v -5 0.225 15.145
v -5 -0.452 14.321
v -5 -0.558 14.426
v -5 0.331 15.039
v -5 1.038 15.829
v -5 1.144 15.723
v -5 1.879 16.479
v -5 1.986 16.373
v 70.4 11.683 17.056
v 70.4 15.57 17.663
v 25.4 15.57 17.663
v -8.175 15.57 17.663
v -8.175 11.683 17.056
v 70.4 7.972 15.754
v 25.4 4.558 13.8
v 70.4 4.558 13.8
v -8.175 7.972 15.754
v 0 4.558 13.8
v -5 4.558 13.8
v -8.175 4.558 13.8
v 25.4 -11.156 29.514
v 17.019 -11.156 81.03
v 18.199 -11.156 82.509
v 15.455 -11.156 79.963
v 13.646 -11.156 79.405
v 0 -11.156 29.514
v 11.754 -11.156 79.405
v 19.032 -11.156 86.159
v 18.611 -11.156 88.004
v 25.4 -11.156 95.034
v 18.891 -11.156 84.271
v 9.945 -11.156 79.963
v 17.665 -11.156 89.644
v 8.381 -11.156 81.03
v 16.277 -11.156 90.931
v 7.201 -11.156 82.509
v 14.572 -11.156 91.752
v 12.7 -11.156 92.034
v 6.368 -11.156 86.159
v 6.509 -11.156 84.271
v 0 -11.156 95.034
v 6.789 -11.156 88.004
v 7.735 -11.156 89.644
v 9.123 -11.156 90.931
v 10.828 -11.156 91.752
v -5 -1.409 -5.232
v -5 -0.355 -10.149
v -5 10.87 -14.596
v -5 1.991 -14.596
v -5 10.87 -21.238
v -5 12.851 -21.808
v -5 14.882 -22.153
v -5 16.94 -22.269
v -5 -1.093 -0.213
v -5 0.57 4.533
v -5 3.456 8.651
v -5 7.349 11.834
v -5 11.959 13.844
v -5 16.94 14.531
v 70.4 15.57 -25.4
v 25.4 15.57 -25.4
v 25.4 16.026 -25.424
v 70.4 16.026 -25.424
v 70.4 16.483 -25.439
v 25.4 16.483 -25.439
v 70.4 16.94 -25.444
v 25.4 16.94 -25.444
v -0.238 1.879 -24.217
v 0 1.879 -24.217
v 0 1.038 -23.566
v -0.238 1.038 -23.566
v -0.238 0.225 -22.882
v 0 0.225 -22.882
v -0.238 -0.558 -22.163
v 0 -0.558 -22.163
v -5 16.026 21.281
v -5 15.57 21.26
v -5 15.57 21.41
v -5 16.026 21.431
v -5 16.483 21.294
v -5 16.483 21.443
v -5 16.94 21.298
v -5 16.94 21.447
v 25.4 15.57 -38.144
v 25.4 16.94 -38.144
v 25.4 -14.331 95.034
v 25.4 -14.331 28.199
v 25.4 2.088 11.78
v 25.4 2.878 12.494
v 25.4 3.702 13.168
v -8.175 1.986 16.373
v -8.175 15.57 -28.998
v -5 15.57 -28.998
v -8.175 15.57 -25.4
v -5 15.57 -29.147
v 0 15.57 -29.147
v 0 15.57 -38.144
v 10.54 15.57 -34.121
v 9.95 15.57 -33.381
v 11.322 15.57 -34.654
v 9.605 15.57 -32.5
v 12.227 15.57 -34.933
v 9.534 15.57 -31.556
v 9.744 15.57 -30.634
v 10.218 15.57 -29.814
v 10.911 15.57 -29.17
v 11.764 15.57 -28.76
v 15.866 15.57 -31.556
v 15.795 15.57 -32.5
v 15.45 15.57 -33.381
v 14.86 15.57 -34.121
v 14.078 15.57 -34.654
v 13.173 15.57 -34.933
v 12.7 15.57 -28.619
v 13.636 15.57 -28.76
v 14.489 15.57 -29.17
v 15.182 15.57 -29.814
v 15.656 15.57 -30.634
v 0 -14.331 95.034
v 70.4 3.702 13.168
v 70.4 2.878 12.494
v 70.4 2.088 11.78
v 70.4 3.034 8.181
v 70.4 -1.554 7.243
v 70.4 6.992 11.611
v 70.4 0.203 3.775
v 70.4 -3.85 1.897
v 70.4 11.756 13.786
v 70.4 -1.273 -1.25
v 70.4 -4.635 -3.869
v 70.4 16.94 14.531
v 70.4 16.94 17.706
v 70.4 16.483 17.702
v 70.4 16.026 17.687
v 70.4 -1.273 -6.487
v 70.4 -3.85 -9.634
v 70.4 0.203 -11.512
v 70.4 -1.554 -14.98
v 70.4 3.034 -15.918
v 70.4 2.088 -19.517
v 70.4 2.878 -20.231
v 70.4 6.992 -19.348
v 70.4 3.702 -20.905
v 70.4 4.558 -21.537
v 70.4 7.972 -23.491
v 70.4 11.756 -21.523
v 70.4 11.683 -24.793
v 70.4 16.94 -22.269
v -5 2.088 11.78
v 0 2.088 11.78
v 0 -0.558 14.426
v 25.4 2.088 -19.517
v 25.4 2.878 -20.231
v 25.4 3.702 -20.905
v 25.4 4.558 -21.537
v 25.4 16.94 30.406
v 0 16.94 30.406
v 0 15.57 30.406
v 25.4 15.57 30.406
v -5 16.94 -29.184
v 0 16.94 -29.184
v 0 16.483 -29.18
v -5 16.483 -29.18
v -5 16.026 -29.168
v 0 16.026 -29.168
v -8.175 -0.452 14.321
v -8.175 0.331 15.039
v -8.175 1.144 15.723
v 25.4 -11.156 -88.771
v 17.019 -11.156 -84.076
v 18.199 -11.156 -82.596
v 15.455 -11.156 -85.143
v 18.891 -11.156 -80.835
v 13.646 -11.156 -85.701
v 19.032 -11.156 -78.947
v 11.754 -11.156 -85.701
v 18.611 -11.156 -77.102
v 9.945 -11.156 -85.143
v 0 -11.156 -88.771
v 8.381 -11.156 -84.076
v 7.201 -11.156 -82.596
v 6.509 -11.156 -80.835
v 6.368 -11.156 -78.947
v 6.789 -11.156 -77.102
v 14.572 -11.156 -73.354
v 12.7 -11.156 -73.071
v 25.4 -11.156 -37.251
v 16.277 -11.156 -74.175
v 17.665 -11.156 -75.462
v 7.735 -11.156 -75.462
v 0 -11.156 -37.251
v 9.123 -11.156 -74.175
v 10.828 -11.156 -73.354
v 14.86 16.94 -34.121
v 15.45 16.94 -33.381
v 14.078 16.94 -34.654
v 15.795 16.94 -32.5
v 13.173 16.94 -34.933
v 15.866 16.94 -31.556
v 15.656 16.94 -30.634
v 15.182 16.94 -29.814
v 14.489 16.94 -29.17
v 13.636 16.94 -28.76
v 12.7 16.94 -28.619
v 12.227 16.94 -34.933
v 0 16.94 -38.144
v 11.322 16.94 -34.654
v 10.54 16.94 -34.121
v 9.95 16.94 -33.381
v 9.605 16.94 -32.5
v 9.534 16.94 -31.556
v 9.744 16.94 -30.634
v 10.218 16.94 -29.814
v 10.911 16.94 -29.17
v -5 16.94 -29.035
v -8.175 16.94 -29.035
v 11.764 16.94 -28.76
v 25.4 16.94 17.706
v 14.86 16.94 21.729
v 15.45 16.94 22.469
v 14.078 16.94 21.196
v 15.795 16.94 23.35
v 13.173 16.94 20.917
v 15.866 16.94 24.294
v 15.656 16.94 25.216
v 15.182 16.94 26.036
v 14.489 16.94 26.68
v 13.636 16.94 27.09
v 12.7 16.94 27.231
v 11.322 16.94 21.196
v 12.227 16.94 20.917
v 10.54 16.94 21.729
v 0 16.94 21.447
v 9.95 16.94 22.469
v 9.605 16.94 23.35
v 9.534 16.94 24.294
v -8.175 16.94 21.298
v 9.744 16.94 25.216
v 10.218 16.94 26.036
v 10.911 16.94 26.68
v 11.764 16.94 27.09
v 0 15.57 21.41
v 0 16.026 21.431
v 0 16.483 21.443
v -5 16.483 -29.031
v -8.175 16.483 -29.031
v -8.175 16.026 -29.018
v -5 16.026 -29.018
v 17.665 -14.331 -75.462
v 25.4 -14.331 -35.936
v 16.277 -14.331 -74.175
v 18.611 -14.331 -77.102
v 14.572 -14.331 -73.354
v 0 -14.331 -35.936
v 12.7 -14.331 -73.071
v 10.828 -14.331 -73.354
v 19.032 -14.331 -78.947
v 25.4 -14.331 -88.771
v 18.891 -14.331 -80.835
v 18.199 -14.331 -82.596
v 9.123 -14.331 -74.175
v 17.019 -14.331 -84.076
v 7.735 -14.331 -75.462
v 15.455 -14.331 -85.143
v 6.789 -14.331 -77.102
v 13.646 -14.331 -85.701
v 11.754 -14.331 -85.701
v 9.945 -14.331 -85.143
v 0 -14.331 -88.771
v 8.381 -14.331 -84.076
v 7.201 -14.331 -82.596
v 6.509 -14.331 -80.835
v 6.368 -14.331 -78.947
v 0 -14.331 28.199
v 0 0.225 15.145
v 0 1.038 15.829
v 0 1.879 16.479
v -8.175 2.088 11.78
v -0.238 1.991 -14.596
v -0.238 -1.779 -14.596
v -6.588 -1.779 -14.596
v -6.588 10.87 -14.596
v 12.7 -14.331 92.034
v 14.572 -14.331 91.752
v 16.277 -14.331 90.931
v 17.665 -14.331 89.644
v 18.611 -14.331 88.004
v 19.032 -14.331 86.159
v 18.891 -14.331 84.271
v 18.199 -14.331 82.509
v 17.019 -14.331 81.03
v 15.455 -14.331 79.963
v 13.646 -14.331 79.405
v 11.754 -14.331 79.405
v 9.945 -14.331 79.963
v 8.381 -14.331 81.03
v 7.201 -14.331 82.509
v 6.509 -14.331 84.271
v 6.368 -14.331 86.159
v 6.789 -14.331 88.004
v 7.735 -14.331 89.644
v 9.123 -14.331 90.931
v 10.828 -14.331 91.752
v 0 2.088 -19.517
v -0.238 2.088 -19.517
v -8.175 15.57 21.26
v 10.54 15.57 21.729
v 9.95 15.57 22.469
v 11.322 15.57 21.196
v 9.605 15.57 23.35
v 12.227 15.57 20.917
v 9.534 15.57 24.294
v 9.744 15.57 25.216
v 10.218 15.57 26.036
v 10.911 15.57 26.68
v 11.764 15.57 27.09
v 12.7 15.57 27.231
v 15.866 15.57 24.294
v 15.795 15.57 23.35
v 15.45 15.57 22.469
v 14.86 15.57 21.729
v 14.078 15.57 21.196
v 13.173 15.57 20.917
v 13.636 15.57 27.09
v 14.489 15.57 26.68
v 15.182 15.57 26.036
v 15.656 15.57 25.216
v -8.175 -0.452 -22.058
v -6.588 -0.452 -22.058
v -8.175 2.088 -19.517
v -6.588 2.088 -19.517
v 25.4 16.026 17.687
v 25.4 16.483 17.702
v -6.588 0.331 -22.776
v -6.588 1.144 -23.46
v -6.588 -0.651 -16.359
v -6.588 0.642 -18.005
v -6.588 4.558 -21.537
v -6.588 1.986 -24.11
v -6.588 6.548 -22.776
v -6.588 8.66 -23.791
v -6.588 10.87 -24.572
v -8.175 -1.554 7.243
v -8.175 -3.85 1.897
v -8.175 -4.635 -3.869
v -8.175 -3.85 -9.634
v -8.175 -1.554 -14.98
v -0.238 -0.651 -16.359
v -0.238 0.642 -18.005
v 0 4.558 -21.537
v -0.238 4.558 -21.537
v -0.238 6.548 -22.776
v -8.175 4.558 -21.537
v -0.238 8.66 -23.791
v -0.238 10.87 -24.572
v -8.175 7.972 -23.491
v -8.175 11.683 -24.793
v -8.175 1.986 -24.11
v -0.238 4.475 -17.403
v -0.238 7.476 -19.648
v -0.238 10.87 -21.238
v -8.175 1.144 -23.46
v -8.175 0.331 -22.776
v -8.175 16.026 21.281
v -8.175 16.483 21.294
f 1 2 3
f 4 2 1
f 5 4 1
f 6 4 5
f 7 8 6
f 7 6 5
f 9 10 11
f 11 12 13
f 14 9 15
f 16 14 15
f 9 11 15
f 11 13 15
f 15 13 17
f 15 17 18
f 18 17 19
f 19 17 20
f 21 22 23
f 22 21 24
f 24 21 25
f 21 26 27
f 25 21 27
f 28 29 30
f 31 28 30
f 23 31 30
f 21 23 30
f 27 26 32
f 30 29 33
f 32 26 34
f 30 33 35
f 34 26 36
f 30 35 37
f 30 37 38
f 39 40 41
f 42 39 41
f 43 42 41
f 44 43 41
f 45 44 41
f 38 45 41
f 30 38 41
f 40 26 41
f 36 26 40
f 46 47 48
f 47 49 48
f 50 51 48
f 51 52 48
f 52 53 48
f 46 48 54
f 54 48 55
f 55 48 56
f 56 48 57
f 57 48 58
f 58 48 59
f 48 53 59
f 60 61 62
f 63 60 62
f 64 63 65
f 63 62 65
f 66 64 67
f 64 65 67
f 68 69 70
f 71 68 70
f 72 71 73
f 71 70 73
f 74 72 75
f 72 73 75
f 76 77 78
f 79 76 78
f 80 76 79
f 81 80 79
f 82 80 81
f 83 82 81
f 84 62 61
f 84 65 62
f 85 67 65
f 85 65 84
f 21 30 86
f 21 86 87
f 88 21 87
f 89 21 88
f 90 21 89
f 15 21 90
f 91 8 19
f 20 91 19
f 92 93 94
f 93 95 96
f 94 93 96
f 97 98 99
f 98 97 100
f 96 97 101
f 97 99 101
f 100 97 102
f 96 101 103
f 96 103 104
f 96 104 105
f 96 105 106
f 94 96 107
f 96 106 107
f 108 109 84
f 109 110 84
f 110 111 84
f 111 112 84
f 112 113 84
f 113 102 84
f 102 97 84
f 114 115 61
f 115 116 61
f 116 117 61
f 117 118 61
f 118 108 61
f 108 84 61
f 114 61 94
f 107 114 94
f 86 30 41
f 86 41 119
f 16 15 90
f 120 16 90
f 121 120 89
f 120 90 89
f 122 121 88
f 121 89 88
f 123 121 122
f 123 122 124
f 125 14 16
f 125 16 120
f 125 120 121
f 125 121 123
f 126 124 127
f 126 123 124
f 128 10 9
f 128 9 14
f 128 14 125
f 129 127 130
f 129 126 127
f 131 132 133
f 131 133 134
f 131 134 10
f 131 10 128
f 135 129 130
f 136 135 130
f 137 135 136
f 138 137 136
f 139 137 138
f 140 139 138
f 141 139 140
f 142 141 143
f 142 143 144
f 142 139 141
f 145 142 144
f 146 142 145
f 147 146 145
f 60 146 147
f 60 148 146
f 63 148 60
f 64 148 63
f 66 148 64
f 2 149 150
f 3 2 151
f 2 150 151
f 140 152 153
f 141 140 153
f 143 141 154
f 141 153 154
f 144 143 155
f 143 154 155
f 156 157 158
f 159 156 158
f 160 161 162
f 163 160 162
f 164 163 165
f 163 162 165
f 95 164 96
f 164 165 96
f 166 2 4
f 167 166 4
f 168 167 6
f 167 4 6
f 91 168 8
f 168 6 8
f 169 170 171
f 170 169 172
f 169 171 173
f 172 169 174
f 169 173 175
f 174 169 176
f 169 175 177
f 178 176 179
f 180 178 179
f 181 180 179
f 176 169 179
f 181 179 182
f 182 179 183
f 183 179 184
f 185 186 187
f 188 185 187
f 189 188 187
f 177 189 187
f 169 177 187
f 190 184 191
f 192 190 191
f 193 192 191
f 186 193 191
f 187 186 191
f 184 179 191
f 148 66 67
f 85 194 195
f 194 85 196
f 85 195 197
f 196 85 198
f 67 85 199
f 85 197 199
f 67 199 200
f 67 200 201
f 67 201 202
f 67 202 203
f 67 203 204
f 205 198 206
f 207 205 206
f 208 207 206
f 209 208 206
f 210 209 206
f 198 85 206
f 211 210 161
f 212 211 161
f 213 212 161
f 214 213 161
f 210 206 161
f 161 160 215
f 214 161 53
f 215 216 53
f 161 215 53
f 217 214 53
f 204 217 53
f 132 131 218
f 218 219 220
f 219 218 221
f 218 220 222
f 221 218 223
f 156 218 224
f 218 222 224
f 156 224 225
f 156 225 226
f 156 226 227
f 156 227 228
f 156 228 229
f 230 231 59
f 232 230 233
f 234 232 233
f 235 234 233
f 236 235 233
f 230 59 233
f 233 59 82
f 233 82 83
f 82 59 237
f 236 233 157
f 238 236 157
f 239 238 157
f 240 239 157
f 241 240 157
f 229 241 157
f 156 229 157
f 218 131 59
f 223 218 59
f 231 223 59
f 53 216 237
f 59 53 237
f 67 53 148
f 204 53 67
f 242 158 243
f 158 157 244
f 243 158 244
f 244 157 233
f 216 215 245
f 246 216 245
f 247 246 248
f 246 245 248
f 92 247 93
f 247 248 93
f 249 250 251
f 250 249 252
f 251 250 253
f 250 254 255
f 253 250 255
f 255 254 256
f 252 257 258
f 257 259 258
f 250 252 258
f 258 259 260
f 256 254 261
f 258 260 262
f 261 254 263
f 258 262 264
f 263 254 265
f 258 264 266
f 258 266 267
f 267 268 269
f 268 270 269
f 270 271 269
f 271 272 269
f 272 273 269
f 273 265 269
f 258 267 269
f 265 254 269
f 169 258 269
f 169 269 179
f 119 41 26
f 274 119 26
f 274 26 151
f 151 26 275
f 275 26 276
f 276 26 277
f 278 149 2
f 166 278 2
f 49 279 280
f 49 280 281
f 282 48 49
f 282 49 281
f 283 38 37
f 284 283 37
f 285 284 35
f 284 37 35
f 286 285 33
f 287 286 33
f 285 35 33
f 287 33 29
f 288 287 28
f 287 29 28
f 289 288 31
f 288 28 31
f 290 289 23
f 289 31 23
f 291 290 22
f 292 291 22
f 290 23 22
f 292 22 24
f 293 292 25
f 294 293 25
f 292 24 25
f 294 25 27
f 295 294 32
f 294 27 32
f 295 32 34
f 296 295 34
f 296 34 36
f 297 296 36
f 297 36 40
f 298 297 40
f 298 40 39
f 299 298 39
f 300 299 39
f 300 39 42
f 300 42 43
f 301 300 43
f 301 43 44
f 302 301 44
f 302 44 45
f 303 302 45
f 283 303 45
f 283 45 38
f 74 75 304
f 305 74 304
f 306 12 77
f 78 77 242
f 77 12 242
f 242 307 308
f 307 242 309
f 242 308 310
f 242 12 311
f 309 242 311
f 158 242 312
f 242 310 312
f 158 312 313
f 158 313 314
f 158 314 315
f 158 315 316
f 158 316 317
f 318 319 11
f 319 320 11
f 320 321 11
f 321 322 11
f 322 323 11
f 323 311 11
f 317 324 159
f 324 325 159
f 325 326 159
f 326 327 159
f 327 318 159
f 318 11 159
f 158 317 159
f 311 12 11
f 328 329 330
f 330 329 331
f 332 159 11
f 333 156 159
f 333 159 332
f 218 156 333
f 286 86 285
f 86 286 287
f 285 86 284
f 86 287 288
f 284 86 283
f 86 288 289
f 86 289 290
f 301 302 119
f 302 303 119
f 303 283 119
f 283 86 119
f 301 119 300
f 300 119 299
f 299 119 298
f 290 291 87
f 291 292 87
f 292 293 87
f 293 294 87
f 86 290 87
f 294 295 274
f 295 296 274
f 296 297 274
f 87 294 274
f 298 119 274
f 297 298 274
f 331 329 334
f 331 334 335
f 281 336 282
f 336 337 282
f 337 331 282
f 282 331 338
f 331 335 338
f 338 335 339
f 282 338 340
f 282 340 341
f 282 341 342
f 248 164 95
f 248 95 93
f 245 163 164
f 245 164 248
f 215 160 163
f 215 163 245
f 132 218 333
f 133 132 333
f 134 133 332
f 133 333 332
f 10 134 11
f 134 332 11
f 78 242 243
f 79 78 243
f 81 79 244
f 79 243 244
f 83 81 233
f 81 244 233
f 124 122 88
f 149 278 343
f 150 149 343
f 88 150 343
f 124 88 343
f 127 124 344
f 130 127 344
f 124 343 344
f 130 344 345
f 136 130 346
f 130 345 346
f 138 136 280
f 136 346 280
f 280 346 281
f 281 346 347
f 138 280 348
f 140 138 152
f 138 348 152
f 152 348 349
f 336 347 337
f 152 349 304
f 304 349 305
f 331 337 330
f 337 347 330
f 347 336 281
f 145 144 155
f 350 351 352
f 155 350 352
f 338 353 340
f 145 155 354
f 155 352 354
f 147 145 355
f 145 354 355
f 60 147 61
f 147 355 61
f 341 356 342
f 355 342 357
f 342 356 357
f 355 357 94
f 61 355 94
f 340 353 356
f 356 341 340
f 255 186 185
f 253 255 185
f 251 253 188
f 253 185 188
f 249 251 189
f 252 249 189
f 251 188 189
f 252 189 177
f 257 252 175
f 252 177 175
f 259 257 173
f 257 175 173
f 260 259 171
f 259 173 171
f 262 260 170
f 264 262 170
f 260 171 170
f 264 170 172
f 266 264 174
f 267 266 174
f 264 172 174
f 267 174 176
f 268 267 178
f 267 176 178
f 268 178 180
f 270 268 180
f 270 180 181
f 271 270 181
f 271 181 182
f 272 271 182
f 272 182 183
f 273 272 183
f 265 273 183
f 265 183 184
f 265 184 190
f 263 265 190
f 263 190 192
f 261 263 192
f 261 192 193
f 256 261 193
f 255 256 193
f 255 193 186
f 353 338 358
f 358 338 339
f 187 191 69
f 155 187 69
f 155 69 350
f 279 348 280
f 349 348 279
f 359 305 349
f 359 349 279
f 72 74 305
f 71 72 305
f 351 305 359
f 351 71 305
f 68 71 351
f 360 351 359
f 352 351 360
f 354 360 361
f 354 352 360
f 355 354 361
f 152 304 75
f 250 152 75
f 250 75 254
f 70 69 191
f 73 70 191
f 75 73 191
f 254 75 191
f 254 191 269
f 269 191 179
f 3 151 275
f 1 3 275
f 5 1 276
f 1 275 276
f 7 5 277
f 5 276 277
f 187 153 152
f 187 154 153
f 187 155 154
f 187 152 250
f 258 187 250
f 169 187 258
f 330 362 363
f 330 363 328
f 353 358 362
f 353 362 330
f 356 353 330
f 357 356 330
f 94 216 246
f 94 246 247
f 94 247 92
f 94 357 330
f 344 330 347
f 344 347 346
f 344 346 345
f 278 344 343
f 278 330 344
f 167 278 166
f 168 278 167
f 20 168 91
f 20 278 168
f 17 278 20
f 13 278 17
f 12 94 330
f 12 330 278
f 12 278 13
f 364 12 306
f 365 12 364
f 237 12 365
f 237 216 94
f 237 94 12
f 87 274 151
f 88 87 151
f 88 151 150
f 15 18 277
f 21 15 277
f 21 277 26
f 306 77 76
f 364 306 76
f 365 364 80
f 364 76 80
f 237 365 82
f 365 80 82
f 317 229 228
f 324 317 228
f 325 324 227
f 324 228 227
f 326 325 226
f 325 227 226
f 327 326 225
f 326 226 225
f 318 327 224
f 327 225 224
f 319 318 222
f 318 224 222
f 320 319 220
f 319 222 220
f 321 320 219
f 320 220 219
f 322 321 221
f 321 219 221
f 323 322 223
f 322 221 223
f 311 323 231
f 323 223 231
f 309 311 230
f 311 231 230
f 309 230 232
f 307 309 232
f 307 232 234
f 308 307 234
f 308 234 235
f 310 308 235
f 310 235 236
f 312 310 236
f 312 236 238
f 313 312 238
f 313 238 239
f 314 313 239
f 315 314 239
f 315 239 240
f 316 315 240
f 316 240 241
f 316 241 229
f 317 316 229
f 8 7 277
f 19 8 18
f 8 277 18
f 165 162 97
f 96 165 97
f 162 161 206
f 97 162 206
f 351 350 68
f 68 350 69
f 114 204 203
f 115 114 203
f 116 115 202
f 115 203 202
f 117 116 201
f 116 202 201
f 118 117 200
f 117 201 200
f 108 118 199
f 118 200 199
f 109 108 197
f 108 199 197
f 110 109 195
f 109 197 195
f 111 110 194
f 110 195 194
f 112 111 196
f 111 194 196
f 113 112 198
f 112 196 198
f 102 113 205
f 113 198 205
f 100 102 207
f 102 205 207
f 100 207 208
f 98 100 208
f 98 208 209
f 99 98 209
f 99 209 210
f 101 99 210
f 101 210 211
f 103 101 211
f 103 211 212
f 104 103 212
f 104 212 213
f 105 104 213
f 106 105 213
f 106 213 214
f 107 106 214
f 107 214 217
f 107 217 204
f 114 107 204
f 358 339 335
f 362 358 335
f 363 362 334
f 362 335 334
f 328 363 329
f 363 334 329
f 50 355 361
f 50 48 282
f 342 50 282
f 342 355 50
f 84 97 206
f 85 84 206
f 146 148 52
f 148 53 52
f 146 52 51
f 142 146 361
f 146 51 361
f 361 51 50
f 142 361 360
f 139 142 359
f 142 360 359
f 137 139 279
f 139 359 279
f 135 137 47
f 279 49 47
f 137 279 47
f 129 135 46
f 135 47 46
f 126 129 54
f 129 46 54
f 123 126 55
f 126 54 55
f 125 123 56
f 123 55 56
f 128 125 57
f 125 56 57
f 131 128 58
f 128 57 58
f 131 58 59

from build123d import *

# Parameters (mm, degrees)
BOSS_EXTRUDE2_DEPTH = 25.4
SKETCH5_R           = 6.35
CUT_EXTRUDE3_DEPTH  = 25.4
SKETCH6_R           = 6.35
CUT_EXTRUDE4_DEPTH  = 25.4
SKETCH7_R           = 3.175
CUT_EXTRUDE5_DEPTH  = 3.175
SKETCH8_R           = 3.175
CUT_EXTRUDE6_DEPTH  = 3.175
BOSS_EXTRUDE3_DEPTH = 5
BOSS_EXTRUDE4_DEPTH = 3.175
SKETCH12_W          = 6.35
SKETCH12_H          = 12.7
CUT_EXTRUDE7_DEPTH  = 74.175
BOSS_EXTRUDE5_DEPTH = 45


with BuildPart() as part:
    # Sketch4 → Boss-Extrude2 (new body)
    with BuildSketch(Plane(origin=(0, 0, 0), x_dir=(0, 0, -1), z_dir=(1, 0, 0))):
        with BuildLine():
            Line((-95.034446017, -11.155981989), (-95.034446017, -14.330981989))
            Line((-95.034446017, -14.330981989), (-28.199126576, -14.330981989))
            Line((-28.199126576, -14.330981989), (-11.780407797, 2.08773679))
            ThreePointArc((-11.780407797, 2.08773679), (3.868526207, -4.634940512), (19.517460211, 2.08773679))
            Line((19.517460211, 2.08773679), (35.93617899, -14.330981989))
            Line((35.93617899, -14.330981989), (88.77149843, -14.330981989))
            Line((88.77149843, -14.330981989), (88.77149843, -11.155981989))
            Line((88.77149843, -11.155981989), (37.251307051, -11.155981989))
            Line((37.251307051, -11.155981989), (21.536971904, 4.558353157))
            ThreePointArc((21.536971904, 4.558353157), (24.227085542, 9.797952879), (25.399969977, 15.569820752))
            Line((25.399969977, 15.569820752), (38.143526207, 15.569820752))
            Line((38.143526207, 15.569820752), (38.143526207, 16.940059488))
            Line((38.143526207, 16.940059488), (22.268526207, 16.940059488))
            ThreePointArc((22.268526207, 16.940059488), (3.868526207, -1.459940512), (-14.531473793, 16.940059488))
            Line((-14.531473793, 16.940059488), (-30.406473793, 16.940059488))
            Line((-30.406473793, 16.940059488), (-30.406473793, 15.569820752))
            Line((-30.406473793, 15.569820752), (-17.662917563, 15.569820752))
            ThreePointArc((-17.662917563, 15.569820752), (-16.490033128, 9.797952879), (-13.79991949, 4.558353157))
            Line((-13.79991949, 4.558353157), (-29.514254637, -11.155981989))
            Line((-29.514254637, -11.155981989), (-95.034446017, -11.155981989))
        make_face()
    extrude(amount=BOSS_EXTRUDE2_DEPTH)

    # Sketch5 → Cut-Extrude3 (cut)
    with BuildSketch(Plane(origin=(0, -11.155981989, 0), x_dir=(1, 0, 0), z_dir=(0, 1, 0))):
        with Locations(Location((12.7, -85.684446017, 0), (0, 0, 270))):
            Circle(SKETCH5_R)
    extrude(amount=-CUT_EXTRUDE3_DEPTH, mode=Mode.SUBTRACT)

    # Sketch6 → Cut-Extrude4 (cut)
    with BuildSketch(Plane(origin=(0, -11.155981989, 0), x_dir=(1, 0, 0), z_dir=(0, 1, 0))):
        with Locations(Location((12.7, 79.42149843, 0), (0, 0, 270))):
            Circle(SKETCH6_R)
    extrude(amount=-CUT_EXTRUDE4_DEPTH, mode=Mode.SUBTRACT)

    # Sketch7 → Cut-Extrude5 (cut)
    with BuildSketch(Plane(origin=(0, 16.940059488, 0), x_dir=(1, 0, 0), z_dir=(0, 1, 0))):
        with Locations(Location((12.7, -24.056473793, 0), (0, 0, 270))):
            Circle(SKETCH7_R)
    extrude(amount=-CUT_EXTRUDE5_DEPTH, mode=Mode.SUBTRACT)

    # Sketch8 → Cut-Extrude6 (cut)
    with BuildSketch(Plane(origin=(0, 16.940059488, 0), x_dir=(1, 0, 0), z_dir=(0, 1, 0))):
        with Locations(Location((12.7, 31.793526207, 0), (0, 0, 270))):
            Circle(SKETCH8_R)
    extrude(amount=-CUT_EXTRUDE6_DEPTH, mode=Mode.SUBTRACT)

    # Sketch10 → Boss-Extrude3 (add)
    with BuildSketch(Plane.ZY):
        with BuildLine():
            Line((-22.268526207, 16.940059488), (-29.184168721, 16.940059488))
            ThreePointArc((-29.184168721, 16.940059488), (-29.174889499, 16.254688903), (-29.147058635, 15.569820752))
            Line((-29.147058635, 15.569820752), (-25.399969977, 15.569820752))
            ThreePointArc((-25.399969977, 15.569820752), (-24.227085542, 9.797952879), (-21.536971904, 4.558353157))
            Line((-21.536971904, 4.558353157), (-24.216513217, 1.878811845))
            ThreePointArc((-24.216513217, 1.878811845), (-23.228268183, 0.628034888), (-22.163262525, -0.558065525))
            Line((-22.163262525, -0.558065525), (-19.517460211, 2.08773679))
            ThreePointArc((-19.517460211, 2.08773679), (-3.868526207, -4.634940512), (11.780407797, 2.08773679))
            Line((11.780407797, 2.08773679), (14.426210111, -0.558065525))
            ThreePointArc((14.426210111, -0.558065525), (15.491215769, 0.628034888), (16.479460803, 1.878811845))
            Line((16.479460803, 1.878811845), (13.79991949, 4.558353157))
            ThreePointArc((13.79991949, 4.558353157), (16.490033128, 9.797952879), (17.662917563, 15.569820752))
            Line((17.662917563, 15.569820752), (21.410006221, 15.569820752))
            ThreePointArc((21.410006221, 15.569820752), (21.437837085, 16.254688903), (21.447116307, 16.940059488))
            Line((21.447116307, 16.940059488), (14.531473793, 16.940059488))
            ThreePointArc((14.531473793, 16.940059488), (-3.868526207, -1.459940512), (-22.268526207, 16.940059488))
        make_face()
    extrude(amount=BOSS_EXTRUDE3_DEPTH)

    # Sketch11 → Boss-Extrude4 (add)
    with BuildSketch(Plane.ZY.offset(5)):
        with BuildLine():
            Line((21.297794872, 16.940059488), (-29.034847286, 16.940059488))
            ThreePointArc((-29.034847286, 16.940059488), (-29.025512905, 16.254685909), (-28.997516686, 15.569820752))
            Line((-28.997516686, 15.569820752), (-25.399969977, 15.569820752))
            ThreePointArc((-25.399969977, 15.569820752), (-24.227085542, 9.797952879), (-21.536971904, 4.558353157))
            Line((-21.536971904, 4.558353157), (-24.109749596, 1.985575465))
            ThreePointArc((-24.109749596, 1.985575465), (-23.122328229, 0.734047506), (-22.057650024, -0.452453023))
            Line((-22.057650024, -0.452453023), (-19.517460211, 2.08773679))
            ThreePointArc((-19.517460211, 2.08773679), (-3.868526207, -4.634940512), (11.780407797, 2.08773679))
            Line((11.780407797, 2.08773679), (14.32059761, -0.452453023))
            ThreePointArc((14.32059761, -0.452453023), (15.385275816, 0.734047506), (16.372697182, 1.985575465))
            Line((16.372697182, 1.985575465), (13.79991949, 4.558353157))
            ThreePointArc((13.79991949, 4.558353157), (16.490033128, 9.797952879), (17.662917563, 15.569820752))
            Line((17.662917563, 15.569820752), (21.260464272, 15.569820752))
            ThreePointArc((21.260464272, 15.569820752), (21.288460491, 16.254685909), (21.297794872, 16.940059488))
        make_face()
    extrude(amount=BOSS_EXTRUDE4_DEPTH)

    # Sketch12 → Cut-Extrude7 (cut)
    with BuildSketch(Plane(origin=(0, 0, -88.77149843), x_dir=(-1, 0, 0), z_dir=(0, 0, -1))):
        with Locations((3.4125, 4.519997663)):
            Rectangle(SKETCH12_W, SKETCH12_H)
    extrude(amount=-CUT_EXTRUDE7_DEPTH, mode=Mode.SUBTRACT)

    # Sketch13 → Boss-Extrude5 (add)
    with BuildSketch(Plane(origin=(25.4, 0, 0), x_dir=(0, 0, -1), z_dir=(1, 0, 0))):
        with BuildLine():
            Line((-14.531473793, 16.940059488), (-17.706473793, 16.940059488))
            ThreePointArc((-17.706473793, 16.940059488), (-17.695581986, 16.254594073), (-17.662917563, 15.569820752))
            ThreePointArc((-17.662917563, 15.569820752), (-16.490033128, 9.797952879), (-13.79991949, 4.558353157))
            ThreePointArc((-13.79991949, 4.558353157), (-12.835902363, 3.285657591), (-11.780407797, 2.08773679))
            ThreePointArc((-11.780407797, 2.08773679), (3.868526207, -4.634940512), (19.517460211, 2.08773679))
            ThreePointArc((19.517460211, 2.08773679), (20.572954777, 3.285657591), (21.536971904, 4.558353157))
            ThreePointArc((21.536971904, 4.558353157), (24.227085542, 9.797952879), (25.399969977, 15.569820752))
            ThreePointArc((25.399969977, 15.569820752), (25.4326344, 16.254594073), (25.443526207, 16.940059488))
            Line((25.443526207, 16.940059488), (22.268526207, 16.940059488))
            ThreePointArc((22.268526207, 16.940059488), (3.868526207, -1.459940512), (-14.531473793, 16.940059488))
        make_face()
    extrude(amount=BOSS_EXTRUDE5_DEPTH)


solid = part.part
